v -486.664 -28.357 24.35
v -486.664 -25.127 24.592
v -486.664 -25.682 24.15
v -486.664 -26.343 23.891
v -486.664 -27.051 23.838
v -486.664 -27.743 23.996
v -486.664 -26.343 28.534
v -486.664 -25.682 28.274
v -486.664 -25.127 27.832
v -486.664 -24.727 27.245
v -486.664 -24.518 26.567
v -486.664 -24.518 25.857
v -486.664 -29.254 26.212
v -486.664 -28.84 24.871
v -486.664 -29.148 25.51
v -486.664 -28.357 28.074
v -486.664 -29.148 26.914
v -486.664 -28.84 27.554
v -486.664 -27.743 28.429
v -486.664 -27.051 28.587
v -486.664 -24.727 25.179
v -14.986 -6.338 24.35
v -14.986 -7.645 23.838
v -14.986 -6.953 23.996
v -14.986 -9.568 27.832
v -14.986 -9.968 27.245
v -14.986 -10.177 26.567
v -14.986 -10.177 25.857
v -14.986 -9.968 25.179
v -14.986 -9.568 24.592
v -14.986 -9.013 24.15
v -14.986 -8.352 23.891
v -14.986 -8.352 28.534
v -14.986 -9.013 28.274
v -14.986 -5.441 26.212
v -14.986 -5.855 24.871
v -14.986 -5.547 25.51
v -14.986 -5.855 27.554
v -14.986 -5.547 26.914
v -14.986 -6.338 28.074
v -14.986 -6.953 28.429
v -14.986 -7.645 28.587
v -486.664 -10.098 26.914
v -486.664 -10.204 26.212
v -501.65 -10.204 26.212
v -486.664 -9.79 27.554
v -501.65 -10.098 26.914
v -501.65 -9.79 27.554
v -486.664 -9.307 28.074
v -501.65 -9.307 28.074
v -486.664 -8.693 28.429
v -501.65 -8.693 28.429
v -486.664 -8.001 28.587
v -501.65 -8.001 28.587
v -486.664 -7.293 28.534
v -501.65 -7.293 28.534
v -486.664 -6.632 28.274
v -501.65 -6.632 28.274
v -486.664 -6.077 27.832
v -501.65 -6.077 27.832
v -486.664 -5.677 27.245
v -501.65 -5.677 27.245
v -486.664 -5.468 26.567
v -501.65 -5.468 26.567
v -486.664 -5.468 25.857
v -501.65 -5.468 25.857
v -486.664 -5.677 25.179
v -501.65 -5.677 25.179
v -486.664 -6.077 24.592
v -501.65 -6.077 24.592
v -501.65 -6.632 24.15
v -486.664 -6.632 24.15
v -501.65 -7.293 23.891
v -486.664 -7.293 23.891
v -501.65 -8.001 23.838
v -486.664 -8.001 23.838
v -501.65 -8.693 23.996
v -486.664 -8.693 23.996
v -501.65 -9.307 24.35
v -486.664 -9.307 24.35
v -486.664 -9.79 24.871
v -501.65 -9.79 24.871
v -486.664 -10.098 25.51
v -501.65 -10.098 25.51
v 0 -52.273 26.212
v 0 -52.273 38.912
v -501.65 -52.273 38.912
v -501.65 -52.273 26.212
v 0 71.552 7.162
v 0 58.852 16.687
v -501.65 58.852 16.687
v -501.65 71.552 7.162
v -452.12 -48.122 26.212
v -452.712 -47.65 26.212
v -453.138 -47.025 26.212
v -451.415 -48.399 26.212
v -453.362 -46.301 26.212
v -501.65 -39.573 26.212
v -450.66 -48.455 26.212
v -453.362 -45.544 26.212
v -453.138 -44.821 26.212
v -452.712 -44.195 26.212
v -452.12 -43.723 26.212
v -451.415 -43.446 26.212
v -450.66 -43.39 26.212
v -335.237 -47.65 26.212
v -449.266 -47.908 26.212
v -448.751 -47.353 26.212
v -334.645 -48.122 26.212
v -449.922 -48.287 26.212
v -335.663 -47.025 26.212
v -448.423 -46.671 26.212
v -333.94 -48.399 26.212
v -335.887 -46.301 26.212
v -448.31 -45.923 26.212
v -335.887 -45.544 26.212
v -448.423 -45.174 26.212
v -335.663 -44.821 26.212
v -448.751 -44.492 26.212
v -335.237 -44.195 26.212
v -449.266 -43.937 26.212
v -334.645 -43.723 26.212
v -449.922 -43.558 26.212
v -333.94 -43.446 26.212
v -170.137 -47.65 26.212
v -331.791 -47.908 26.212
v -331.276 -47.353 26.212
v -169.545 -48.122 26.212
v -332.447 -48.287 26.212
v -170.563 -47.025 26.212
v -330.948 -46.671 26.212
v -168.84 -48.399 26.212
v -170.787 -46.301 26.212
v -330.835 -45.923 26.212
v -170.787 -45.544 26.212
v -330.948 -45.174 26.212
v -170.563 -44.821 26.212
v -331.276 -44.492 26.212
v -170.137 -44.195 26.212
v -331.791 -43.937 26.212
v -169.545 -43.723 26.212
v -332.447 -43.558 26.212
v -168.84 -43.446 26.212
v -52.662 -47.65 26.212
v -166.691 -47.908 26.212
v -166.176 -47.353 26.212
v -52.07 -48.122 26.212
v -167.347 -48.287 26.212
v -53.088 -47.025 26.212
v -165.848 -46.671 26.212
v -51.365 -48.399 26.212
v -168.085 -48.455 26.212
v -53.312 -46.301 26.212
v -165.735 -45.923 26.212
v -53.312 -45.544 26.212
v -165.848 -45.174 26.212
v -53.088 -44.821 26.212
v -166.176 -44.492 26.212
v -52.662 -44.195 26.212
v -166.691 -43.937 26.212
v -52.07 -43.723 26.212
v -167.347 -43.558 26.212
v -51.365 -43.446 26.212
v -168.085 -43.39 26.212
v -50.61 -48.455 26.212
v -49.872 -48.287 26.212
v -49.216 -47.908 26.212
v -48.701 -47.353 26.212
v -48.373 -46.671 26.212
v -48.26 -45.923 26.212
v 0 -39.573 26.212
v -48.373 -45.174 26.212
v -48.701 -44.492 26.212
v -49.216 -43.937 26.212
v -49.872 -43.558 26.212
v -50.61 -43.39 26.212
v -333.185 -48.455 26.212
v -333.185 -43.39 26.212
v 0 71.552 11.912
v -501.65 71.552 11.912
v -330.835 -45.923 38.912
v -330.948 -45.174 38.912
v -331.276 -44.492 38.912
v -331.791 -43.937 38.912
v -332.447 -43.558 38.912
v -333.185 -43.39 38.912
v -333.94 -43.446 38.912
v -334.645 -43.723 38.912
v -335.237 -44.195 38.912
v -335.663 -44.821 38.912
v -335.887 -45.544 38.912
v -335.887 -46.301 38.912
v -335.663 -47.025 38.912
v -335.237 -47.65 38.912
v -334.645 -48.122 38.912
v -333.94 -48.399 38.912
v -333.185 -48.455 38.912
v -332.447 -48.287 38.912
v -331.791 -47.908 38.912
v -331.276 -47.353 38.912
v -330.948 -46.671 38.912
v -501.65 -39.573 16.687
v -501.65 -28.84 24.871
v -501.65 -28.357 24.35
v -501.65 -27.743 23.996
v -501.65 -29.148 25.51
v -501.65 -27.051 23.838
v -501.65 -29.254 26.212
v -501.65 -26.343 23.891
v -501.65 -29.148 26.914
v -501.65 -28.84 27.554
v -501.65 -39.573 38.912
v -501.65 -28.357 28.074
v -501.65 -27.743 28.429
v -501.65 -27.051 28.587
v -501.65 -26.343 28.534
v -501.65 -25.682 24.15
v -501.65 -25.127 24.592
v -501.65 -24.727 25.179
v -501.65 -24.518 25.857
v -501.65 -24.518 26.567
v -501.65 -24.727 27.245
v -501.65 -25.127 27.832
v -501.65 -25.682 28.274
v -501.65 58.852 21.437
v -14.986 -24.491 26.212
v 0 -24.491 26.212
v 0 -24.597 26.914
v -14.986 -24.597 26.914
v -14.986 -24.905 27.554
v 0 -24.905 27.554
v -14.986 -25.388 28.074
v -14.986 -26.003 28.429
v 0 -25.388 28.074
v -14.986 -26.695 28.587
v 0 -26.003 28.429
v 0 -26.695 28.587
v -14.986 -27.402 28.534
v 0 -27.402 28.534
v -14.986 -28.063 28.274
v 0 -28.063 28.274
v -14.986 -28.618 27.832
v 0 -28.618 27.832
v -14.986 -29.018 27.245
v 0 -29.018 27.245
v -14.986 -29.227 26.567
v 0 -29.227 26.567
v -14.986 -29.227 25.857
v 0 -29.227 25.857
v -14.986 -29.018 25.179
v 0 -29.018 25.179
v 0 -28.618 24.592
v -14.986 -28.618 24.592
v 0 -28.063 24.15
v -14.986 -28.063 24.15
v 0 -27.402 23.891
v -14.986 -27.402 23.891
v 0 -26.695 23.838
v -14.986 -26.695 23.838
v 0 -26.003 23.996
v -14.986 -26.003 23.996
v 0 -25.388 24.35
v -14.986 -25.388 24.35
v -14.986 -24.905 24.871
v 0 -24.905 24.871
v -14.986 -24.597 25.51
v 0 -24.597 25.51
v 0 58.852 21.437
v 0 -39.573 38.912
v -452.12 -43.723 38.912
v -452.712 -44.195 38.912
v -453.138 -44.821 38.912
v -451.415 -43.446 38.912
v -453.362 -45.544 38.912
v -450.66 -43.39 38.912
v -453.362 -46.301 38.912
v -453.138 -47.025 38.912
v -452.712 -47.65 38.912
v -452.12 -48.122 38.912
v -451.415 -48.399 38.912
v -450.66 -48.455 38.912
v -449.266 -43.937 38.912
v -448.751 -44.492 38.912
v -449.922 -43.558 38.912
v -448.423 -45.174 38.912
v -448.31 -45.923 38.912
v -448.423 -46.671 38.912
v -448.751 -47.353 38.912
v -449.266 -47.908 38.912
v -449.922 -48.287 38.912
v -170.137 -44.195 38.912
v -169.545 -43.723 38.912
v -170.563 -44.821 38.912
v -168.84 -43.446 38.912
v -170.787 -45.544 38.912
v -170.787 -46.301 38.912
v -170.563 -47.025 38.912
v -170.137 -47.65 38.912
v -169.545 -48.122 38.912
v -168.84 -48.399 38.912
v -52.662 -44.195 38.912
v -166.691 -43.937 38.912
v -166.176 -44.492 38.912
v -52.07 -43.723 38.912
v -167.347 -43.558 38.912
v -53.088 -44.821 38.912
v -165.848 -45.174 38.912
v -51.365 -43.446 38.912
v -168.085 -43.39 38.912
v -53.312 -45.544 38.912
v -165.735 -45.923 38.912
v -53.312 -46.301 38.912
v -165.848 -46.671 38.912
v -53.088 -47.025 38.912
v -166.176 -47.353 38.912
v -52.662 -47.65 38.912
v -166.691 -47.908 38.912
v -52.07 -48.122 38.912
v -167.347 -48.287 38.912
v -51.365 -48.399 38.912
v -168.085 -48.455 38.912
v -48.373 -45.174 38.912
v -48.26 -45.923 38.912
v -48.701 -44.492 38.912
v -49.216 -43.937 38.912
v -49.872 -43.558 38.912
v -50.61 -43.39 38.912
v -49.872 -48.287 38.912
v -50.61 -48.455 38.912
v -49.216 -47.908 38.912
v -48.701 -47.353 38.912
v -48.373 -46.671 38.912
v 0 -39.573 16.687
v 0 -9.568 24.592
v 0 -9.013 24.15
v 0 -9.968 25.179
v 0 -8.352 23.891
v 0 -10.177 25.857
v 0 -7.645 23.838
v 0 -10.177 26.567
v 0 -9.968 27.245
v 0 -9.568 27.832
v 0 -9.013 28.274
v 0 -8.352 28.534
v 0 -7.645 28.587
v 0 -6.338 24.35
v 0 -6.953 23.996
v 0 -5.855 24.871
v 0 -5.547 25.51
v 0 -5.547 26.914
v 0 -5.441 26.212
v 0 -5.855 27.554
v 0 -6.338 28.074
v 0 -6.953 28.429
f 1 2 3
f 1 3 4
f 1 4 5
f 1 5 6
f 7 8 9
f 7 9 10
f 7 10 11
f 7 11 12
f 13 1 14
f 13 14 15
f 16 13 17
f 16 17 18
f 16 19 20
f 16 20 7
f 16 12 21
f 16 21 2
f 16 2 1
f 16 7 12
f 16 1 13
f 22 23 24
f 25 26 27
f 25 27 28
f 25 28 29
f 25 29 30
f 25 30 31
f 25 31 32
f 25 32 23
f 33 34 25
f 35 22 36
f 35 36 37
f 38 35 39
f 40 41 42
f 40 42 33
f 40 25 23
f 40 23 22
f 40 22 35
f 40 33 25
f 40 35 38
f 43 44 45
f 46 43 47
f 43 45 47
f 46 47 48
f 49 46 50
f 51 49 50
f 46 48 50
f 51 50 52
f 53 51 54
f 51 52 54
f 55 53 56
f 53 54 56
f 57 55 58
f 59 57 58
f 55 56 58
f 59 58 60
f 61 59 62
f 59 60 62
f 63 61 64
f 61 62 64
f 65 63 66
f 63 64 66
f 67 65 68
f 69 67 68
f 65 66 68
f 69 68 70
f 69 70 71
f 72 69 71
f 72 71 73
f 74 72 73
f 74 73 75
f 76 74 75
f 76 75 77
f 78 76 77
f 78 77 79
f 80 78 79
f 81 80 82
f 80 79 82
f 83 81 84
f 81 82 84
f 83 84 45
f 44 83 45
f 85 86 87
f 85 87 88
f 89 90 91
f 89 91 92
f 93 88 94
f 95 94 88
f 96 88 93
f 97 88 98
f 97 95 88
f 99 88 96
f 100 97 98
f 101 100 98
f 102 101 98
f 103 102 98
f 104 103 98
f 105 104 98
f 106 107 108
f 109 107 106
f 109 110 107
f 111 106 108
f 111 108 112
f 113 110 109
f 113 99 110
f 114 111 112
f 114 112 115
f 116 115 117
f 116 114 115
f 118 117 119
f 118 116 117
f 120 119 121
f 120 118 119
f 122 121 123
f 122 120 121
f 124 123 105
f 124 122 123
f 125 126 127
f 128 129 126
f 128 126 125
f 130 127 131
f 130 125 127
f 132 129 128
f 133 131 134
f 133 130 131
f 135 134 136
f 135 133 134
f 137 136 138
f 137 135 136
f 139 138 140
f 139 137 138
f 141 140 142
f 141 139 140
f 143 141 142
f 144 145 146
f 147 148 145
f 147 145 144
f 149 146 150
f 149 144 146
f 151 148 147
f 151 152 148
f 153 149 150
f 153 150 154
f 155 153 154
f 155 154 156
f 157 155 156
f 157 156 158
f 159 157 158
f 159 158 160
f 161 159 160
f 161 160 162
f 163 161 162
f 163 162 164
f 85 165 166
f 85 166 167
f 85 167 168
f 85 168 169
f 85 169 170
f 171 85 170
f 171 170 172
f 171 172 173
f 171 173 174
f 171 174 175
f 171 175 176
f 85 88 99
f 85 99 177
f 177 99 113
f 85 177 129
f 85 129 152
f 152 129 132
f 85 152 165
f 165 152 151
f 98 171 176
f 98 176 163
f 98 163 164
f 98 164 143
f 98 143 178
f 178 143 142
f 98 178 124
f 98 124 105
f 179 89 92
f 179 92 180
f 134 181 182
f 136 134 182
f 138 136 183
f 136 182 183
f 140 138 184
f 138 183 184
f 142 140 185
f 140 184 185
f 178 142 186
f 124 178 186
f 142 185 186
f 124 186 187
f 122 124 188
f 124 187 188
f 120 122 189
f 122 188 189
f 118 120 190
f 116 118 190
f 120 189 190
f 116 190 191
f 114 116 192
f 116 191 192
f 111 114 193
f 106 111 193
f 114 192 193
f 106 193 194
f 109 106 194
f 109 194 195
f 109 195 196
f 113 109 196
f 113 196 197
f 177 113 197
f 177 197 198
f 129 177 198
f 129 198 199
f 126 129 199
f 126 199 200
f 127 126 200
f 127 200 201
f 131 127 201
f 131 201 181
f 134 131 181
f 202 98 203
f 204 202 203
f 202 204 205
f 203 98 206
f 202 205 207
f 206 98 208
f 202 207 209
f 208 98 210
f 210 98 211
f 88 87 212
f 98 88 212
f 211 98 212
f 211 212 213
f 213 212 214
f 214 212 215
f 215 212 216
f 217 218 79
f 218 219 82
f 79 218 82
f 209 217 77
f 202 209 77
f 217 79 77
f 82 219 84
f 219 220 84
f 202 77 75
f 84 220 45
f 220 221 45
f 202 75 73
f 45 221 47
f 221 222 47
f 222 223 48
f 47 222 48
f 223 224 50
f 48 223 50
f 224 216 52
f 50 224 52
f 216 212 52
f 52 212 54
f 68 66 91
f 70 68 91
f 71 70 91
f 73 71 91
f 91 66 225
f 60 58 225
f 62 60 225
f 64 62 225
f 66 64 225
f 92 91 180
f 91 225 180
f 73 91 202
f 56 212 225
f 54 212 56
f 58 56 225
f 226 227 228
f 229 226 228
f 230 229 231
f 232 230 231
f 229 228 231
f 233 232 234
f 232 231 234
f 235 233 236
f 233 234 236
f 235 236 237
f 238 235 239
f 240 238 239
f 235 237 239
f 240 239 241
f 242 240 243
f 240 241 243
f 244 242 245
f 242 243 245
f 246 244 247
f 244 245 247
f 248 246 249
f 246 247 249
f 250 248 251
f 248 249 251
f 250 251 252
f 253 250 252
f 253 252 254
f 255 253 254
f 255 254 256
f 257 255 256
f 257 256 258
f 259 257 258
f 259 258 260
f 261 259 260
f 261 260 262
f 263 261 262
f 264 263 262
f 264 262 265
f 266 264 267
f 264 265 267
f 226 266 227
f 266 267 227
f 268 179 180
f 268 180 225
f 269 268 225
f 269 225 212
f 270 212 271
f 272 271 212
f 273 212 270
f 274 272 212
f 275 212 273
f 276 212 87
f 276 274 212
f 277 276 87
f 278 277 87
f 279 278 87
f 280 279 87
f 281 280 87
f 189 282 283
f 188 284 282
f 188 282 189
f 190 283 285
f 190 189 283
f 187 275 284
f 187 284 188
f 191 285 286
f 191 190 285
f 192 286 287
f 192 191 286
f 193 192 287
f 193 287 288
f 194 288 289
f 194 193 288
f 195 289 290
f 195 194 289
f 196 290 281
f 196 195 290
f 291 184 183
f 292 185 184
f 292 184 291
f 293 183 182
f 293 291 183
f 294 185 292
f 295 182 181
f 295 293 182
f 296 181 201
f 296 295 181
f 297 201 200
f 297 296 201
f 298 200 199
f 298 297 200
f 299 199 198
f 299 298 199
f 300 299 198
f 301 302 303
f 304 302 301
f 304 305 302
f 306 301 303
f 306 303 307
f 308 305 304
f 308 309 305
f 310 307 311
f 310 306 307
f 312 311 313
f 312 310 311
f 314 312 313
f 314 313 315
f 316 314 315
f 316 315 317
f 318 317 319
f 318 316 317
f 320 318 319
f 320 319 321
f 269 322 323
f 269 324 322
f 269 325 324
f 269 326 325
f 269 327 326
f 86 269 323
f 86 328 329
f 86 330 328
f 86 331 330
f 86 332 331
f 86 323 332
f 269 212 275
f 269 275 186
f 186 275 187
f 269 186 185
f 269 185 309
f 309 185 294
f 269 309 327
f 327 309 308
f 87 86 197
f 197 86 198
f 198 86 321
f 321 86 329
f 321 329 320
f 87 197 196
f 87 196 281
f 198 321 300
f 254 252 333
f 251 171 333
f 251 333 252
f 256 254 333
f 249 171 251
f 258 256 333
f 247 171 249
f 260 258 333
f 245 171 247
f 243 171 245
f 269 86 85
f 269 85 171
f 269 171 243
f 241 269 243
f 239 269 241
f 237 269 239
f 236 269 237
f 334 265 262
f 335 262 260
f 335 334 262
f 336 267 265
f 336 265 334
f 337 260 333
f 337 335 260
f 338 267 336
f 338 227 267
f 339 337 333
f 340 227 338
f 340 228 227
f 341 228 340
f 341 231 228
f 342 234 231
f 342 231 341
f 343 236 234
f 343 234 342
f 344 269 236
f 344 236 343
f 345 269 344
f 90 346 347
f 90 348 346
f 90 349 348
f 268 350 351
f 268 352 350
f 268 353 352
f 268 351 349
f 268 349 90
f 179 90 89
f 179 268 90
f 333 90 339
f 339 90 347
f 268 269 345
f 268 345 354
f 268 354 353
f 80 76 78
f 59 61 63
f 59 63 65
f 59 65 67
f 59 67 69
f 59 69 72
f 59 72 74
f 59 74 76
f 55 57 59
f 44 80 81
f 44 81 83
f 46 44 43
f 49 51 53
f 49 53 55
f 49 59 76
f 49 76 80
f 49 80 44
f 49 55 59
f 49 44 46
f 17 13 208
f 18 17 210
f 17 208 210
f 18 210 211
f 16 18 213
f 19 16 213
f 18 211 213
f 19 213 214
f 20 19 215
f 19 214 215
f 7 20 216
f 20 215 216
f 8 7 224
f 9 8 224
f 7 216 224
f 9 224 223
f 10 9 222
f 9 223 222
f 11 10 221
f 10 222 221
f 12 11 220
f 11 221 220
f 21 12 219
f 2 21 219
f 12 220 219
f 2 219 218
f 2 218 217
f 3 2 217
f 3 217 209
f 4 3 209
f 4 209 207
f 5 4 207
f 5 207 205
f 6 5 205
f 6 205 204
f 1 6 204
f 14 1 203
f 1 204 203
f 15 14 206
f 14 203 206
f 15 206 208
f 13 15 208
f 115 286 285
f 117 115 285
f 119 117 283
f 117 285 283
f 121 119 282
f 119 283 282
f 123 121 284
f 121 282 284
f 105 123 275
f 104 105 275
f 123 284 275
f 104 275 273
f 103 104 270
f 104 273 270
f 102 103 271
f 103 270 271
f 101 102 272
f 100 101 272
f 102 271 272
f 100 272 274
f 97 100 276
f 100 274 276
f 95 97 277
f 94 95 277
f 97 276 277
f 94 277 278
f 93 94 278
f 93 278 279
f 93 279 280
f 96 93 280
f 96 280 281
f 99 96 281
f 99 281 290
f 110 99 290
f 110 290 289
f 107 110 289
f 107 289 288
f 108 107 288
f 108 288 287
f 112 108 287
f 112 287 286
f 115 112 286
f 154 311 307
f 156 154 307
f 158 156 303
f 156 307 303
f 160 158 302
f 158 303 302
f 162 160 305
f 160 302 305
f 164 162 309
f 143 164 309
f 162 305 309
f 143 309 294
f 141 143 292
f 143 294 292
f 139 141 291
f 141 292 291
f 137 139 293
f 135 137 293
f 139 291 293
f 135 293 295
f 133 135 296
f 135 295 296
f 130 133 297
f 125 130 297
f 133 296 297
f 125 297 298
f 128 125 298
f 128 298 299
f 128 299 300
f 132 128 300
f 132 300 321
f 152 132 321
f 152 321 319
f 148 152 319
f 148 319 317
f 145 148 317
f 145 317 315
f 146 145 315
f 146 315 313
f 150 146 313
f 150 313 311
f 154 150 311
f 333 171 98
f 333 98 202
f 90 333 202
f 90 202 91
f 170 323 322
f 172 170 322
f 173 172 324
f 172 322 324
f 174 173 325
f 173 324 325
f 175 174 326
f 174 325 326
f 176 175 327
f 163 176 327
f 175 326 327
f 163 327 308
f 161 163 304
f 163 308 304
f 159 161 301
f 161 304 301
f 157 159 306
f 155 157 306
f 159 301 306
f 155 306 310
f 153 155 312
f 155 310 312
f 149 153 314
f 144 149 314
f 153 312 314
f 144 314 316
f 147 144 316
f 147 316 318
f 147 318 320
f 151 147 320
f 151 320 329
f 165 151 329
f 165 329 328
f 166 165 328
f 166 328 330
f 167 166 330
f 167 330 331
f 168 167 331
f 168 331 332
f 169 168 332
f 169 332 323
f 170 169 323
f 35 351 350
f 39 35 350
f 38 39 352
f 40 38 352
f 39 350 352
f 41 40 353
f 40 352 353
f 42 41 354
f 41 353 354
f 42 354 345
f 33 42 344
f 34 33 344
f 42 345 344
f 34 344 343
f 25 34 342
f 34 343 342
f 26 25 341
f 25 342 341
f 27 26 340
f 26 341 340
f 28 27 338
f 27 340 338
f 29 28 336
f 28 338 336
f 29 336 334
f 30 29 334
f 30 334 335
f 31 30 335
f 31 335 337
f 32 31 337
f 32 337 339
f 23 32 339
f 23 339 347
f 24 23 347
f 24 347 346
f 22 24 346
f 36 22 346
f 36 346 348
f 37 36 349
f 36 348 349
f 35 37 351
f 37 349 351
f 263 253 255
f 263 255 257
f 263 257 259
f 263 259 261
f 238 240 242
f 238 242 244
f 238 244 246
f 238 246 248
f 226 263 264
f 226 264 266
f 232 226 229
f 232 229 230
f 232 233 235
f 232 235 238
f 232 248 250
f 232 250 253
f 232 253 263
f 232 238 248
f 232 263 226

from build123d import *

# Parameters (mm, degrees)
F1_DEPTH = 501.65
F2_R     = 2.38125
F3_DEPTH = 14.986
F4_R     = 2.38125
F5_DEPTH = 14.986
F6_R     = 2.54
F7_DEPTH = 31.751


with BuildPart() as f1:
    # F0 (on Right) → F1 (new body)
    with BuildSketch(Plane.YZ):
        Polygon((-39.572591, 38.912156), (-52.272591, 38.912156), (-52.272591, 26.212156), (-39.572591, 26.212156), (-39.572591, 16.687156), (58.852409, 16.687156), (71.552409, 7.162156), (71.552409, 11.911956), (58.852409, 21.436956), align=None)
    extrude(amount=-F1_DEPTH)

    # F2 (on face) → F3 (cut)
    with BuildSketch(Plane.YZ):
        with Locations((-26.872591, 26.212156)):
            Circle(F2_R)
        with Locations((-7.822591, 26.212156)):
            Circle(F2_R)
    extrude(amount=-F3_DEPTH, mode=Mode.SUBTRACT)

    # F4 (on face) → F5 (cut)
    with BuildSketch(Plane(origin=(-501.65, 0, 0), x_dir=(0, -1, 0), z_dir=(-1, 0, 0))):
        with Locations((26.872591, 26.212156)):
            Circle(F4_R)
        with Locations((7.822591, 26.212156)):
            Circle(F4_R)
    extrude(amount=-F5_DEPTH, mode=Mode.SUBTRACT)

    # F6 (on face) → F7 (cut, through all)
    with BuildSketch(Plane.XY.offset(38.912156)):
        with Locations((-450.85, -45.922591)):
            Circle(F6_R)
        with Locations((-333.375, -45.922591)):
            Circle(F6_R)
        with Locations((-168.275, -45.922591)):
            Circle(F6_R)
        with Locations((-50.8, -45.922591)):
            Circle(F6_R)
    extrude(amount=-F7_DEPTH, mode=Mode.SUBTRACT)


solid = f1.part
